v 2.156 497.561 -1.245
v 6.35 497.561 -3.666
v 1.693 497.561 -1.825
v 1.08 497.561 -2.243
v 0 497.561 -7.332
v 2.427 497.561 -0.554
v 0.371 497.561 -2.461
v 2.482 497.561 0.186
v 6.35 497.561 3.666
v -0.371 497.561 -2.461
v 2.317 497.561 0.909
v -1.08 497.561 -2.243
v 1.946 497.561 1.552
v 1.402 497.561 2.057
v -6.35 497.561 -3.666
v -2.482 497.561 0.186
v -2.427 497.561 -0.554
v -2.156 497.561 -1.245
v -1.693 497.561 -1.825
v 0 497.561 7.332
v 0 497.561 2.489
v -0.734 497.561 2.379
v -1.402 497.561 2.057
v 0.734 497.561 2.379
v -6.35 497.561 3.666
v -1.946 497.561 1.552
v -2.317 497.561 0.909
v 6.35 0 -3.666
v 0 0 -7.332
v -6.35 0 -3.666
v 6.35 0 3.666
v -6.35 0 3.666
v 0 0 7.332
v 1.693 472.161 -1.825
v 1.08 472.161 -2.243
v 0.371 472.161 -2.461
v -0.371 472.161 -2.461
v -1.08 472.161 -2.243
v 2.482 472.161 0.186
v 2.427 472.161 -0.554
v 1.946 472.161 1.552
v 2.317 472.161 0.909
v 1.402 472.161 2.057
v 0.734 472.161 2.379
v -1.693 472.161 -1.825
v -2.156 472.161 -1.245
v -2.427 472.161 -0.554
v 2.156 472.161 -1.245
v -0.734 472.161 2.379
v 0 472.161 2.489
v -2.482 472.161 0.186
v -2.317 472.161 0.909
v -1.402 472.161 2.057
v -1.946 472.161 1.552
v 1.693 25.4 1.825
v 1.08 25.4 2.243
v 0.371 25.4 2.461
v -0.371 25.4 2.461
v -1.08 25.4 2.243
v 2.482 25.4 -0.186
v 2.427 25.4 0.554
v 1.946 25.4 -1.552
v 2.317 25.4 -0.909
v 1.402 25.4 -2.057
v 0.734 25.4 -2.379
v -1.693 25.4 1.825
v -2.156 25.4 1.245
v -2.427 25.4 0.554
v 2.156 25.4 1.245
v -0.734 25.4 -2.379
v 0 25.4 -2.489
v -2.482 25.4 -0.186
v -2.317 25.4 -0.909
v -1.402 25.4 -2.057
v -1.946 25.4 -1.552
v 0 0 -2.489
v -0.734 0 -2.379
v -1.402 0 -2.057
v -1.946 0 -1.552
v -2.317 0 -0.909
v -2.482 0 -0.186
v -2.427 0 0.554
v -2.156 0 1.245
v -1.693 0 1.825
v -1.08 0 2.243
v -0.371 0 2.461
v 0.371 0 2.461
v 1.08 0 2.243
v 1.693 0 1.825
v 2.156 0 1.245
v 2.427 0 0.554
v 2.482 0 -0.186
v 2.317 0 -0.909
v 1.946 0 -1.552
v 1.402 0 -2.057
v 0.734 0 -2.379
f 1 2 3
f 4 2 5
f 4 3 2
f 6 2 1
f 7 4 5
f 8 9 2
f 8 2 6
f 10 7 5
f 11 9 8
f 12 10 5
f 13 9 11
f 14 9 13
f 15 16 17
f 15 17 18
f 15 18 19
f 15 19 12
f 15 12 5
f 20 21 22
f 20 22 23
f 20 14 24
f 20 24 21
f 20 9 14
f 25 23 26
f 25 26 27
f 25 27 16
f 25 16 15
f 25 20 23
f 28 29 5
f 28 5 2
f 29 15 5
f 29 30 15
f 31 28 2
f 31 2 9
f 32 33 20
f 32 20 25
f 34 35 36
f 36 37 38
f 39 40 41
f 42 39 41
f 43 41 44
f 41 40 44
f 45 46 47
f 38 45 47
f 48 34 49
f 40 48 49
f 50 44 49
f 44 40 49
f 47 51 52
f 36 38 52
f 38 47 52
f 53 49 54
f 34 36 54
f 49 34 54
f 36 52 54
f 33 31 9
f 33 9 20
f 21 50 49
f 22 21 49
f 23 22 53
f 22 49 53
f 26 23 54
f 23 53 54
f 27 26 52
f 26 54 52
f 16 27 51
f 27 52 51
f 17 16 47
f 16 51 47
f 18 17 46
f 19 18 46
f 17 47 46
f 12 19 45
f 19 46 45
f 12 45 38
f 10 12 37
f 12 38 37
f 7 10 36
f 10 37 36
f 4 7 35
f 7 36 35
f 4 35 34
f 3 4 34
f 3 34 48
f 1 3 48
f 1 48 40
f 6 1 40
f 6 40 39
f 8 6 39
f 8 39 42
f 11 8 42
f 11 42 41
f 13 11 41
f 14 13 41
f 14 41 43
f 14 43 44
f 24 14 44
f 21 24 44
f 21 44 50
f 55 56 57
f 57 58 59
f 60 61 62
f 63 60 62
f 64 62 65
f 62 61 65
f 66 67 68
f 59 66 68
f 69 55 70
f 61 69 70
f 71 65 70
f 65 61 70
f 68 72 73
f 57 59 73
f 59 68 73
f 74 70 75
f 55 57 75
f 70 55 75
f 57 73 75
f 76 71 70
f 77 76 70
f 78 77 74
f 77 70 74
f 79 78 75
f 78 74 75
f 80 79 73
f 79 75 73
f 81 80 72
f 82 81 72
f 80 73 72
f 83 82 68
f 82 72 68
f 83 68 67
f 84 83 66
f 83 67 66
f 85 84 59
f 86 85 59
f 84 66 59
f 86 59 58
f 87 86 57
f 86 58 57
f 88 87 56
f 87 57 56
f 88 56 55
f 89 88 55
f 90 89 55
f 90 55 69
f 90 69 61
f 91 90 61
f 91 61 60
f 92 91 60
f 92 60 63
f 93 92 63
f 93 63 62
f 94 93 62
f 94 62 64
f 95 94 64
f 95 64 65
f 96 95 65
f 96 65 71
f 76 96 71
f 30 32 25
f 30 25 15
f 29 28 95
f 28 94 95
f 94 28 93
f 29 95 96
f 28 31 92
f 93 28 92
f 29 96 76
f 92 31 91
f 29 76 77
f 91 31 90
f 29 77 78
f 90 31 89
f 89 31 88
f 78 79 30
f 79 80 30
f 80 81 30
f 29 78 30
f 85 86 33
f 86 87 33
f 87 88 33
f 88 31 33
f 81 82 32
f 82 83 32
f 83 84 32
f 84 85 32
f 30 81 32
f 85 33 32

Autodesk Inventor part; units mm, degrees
ref_plane "YZ Plane" through (0, 0, 0) normal (1, 0, 0) x (0, 1, 0)
ref_plane "XZ Plane" through (0, 0, 0) normal (0, 1, 0) x (-1, 0, 0)
ref_plane "XY Plane" through (0, 0, 0) normal (0, 0, 1) x (1, 0, 0)
sketch "Sketch1" plane through (0, 0, 0) normal (0, 1, 0) x (-1, 0, 0)
  line L0 (6.35, -3.6662) -> (0, -7.3323)
  line L1 (0, -7.3323) -> (-6.35, -3.6662)
  line L2 (-6.35, -3.6662) -> (-6.35, 3.6662)
  line L3 (-6.35, 3.6662) -> (0, 7.3323)
  line L4 (0, 7.3323) -> (6.35, 3.6662)
  line L5 (6.35, 3.6662) -> (6.35, -3.6662)
  point P0 (0, 0)
  point P1 (0, 0)
  point P2 (0, 0)
  dimension "d0" = 12.7
extrude "Extrusion1" add sketch "Sketch1" along normal blind 497.5606
sketch "Sketch2" plane through (0, 0, 0) normal (0, -1, 0) x (1, 0, 0)
  point P0 (0, 0)
  point P1 (0, 0)
hole "Hole1" at (0, 0, 0) direction (0, 1, 0) diameter 4.9784 depth 25.4 thread size "1/4-20 UNC" class "2B" standard "ANSI Unified Screw Threads"
sketch "Sketch3" plane through (0, 497.5606, 0) normal (0, 1, 0) x (1, 0, 0)
  point P0 (0, 0)
  point P1 (0, 0)
hole "Hole2" at (0, 497.5606, 0) direction (0, -1, 0) diameter 4.9784 depth 25.4 thread size "1/4-20 UNC" class "2B" standard "ANSI Unified Screw Threads"
properties part number "Intake HexShaft 1" material "Aluminum 6061"
